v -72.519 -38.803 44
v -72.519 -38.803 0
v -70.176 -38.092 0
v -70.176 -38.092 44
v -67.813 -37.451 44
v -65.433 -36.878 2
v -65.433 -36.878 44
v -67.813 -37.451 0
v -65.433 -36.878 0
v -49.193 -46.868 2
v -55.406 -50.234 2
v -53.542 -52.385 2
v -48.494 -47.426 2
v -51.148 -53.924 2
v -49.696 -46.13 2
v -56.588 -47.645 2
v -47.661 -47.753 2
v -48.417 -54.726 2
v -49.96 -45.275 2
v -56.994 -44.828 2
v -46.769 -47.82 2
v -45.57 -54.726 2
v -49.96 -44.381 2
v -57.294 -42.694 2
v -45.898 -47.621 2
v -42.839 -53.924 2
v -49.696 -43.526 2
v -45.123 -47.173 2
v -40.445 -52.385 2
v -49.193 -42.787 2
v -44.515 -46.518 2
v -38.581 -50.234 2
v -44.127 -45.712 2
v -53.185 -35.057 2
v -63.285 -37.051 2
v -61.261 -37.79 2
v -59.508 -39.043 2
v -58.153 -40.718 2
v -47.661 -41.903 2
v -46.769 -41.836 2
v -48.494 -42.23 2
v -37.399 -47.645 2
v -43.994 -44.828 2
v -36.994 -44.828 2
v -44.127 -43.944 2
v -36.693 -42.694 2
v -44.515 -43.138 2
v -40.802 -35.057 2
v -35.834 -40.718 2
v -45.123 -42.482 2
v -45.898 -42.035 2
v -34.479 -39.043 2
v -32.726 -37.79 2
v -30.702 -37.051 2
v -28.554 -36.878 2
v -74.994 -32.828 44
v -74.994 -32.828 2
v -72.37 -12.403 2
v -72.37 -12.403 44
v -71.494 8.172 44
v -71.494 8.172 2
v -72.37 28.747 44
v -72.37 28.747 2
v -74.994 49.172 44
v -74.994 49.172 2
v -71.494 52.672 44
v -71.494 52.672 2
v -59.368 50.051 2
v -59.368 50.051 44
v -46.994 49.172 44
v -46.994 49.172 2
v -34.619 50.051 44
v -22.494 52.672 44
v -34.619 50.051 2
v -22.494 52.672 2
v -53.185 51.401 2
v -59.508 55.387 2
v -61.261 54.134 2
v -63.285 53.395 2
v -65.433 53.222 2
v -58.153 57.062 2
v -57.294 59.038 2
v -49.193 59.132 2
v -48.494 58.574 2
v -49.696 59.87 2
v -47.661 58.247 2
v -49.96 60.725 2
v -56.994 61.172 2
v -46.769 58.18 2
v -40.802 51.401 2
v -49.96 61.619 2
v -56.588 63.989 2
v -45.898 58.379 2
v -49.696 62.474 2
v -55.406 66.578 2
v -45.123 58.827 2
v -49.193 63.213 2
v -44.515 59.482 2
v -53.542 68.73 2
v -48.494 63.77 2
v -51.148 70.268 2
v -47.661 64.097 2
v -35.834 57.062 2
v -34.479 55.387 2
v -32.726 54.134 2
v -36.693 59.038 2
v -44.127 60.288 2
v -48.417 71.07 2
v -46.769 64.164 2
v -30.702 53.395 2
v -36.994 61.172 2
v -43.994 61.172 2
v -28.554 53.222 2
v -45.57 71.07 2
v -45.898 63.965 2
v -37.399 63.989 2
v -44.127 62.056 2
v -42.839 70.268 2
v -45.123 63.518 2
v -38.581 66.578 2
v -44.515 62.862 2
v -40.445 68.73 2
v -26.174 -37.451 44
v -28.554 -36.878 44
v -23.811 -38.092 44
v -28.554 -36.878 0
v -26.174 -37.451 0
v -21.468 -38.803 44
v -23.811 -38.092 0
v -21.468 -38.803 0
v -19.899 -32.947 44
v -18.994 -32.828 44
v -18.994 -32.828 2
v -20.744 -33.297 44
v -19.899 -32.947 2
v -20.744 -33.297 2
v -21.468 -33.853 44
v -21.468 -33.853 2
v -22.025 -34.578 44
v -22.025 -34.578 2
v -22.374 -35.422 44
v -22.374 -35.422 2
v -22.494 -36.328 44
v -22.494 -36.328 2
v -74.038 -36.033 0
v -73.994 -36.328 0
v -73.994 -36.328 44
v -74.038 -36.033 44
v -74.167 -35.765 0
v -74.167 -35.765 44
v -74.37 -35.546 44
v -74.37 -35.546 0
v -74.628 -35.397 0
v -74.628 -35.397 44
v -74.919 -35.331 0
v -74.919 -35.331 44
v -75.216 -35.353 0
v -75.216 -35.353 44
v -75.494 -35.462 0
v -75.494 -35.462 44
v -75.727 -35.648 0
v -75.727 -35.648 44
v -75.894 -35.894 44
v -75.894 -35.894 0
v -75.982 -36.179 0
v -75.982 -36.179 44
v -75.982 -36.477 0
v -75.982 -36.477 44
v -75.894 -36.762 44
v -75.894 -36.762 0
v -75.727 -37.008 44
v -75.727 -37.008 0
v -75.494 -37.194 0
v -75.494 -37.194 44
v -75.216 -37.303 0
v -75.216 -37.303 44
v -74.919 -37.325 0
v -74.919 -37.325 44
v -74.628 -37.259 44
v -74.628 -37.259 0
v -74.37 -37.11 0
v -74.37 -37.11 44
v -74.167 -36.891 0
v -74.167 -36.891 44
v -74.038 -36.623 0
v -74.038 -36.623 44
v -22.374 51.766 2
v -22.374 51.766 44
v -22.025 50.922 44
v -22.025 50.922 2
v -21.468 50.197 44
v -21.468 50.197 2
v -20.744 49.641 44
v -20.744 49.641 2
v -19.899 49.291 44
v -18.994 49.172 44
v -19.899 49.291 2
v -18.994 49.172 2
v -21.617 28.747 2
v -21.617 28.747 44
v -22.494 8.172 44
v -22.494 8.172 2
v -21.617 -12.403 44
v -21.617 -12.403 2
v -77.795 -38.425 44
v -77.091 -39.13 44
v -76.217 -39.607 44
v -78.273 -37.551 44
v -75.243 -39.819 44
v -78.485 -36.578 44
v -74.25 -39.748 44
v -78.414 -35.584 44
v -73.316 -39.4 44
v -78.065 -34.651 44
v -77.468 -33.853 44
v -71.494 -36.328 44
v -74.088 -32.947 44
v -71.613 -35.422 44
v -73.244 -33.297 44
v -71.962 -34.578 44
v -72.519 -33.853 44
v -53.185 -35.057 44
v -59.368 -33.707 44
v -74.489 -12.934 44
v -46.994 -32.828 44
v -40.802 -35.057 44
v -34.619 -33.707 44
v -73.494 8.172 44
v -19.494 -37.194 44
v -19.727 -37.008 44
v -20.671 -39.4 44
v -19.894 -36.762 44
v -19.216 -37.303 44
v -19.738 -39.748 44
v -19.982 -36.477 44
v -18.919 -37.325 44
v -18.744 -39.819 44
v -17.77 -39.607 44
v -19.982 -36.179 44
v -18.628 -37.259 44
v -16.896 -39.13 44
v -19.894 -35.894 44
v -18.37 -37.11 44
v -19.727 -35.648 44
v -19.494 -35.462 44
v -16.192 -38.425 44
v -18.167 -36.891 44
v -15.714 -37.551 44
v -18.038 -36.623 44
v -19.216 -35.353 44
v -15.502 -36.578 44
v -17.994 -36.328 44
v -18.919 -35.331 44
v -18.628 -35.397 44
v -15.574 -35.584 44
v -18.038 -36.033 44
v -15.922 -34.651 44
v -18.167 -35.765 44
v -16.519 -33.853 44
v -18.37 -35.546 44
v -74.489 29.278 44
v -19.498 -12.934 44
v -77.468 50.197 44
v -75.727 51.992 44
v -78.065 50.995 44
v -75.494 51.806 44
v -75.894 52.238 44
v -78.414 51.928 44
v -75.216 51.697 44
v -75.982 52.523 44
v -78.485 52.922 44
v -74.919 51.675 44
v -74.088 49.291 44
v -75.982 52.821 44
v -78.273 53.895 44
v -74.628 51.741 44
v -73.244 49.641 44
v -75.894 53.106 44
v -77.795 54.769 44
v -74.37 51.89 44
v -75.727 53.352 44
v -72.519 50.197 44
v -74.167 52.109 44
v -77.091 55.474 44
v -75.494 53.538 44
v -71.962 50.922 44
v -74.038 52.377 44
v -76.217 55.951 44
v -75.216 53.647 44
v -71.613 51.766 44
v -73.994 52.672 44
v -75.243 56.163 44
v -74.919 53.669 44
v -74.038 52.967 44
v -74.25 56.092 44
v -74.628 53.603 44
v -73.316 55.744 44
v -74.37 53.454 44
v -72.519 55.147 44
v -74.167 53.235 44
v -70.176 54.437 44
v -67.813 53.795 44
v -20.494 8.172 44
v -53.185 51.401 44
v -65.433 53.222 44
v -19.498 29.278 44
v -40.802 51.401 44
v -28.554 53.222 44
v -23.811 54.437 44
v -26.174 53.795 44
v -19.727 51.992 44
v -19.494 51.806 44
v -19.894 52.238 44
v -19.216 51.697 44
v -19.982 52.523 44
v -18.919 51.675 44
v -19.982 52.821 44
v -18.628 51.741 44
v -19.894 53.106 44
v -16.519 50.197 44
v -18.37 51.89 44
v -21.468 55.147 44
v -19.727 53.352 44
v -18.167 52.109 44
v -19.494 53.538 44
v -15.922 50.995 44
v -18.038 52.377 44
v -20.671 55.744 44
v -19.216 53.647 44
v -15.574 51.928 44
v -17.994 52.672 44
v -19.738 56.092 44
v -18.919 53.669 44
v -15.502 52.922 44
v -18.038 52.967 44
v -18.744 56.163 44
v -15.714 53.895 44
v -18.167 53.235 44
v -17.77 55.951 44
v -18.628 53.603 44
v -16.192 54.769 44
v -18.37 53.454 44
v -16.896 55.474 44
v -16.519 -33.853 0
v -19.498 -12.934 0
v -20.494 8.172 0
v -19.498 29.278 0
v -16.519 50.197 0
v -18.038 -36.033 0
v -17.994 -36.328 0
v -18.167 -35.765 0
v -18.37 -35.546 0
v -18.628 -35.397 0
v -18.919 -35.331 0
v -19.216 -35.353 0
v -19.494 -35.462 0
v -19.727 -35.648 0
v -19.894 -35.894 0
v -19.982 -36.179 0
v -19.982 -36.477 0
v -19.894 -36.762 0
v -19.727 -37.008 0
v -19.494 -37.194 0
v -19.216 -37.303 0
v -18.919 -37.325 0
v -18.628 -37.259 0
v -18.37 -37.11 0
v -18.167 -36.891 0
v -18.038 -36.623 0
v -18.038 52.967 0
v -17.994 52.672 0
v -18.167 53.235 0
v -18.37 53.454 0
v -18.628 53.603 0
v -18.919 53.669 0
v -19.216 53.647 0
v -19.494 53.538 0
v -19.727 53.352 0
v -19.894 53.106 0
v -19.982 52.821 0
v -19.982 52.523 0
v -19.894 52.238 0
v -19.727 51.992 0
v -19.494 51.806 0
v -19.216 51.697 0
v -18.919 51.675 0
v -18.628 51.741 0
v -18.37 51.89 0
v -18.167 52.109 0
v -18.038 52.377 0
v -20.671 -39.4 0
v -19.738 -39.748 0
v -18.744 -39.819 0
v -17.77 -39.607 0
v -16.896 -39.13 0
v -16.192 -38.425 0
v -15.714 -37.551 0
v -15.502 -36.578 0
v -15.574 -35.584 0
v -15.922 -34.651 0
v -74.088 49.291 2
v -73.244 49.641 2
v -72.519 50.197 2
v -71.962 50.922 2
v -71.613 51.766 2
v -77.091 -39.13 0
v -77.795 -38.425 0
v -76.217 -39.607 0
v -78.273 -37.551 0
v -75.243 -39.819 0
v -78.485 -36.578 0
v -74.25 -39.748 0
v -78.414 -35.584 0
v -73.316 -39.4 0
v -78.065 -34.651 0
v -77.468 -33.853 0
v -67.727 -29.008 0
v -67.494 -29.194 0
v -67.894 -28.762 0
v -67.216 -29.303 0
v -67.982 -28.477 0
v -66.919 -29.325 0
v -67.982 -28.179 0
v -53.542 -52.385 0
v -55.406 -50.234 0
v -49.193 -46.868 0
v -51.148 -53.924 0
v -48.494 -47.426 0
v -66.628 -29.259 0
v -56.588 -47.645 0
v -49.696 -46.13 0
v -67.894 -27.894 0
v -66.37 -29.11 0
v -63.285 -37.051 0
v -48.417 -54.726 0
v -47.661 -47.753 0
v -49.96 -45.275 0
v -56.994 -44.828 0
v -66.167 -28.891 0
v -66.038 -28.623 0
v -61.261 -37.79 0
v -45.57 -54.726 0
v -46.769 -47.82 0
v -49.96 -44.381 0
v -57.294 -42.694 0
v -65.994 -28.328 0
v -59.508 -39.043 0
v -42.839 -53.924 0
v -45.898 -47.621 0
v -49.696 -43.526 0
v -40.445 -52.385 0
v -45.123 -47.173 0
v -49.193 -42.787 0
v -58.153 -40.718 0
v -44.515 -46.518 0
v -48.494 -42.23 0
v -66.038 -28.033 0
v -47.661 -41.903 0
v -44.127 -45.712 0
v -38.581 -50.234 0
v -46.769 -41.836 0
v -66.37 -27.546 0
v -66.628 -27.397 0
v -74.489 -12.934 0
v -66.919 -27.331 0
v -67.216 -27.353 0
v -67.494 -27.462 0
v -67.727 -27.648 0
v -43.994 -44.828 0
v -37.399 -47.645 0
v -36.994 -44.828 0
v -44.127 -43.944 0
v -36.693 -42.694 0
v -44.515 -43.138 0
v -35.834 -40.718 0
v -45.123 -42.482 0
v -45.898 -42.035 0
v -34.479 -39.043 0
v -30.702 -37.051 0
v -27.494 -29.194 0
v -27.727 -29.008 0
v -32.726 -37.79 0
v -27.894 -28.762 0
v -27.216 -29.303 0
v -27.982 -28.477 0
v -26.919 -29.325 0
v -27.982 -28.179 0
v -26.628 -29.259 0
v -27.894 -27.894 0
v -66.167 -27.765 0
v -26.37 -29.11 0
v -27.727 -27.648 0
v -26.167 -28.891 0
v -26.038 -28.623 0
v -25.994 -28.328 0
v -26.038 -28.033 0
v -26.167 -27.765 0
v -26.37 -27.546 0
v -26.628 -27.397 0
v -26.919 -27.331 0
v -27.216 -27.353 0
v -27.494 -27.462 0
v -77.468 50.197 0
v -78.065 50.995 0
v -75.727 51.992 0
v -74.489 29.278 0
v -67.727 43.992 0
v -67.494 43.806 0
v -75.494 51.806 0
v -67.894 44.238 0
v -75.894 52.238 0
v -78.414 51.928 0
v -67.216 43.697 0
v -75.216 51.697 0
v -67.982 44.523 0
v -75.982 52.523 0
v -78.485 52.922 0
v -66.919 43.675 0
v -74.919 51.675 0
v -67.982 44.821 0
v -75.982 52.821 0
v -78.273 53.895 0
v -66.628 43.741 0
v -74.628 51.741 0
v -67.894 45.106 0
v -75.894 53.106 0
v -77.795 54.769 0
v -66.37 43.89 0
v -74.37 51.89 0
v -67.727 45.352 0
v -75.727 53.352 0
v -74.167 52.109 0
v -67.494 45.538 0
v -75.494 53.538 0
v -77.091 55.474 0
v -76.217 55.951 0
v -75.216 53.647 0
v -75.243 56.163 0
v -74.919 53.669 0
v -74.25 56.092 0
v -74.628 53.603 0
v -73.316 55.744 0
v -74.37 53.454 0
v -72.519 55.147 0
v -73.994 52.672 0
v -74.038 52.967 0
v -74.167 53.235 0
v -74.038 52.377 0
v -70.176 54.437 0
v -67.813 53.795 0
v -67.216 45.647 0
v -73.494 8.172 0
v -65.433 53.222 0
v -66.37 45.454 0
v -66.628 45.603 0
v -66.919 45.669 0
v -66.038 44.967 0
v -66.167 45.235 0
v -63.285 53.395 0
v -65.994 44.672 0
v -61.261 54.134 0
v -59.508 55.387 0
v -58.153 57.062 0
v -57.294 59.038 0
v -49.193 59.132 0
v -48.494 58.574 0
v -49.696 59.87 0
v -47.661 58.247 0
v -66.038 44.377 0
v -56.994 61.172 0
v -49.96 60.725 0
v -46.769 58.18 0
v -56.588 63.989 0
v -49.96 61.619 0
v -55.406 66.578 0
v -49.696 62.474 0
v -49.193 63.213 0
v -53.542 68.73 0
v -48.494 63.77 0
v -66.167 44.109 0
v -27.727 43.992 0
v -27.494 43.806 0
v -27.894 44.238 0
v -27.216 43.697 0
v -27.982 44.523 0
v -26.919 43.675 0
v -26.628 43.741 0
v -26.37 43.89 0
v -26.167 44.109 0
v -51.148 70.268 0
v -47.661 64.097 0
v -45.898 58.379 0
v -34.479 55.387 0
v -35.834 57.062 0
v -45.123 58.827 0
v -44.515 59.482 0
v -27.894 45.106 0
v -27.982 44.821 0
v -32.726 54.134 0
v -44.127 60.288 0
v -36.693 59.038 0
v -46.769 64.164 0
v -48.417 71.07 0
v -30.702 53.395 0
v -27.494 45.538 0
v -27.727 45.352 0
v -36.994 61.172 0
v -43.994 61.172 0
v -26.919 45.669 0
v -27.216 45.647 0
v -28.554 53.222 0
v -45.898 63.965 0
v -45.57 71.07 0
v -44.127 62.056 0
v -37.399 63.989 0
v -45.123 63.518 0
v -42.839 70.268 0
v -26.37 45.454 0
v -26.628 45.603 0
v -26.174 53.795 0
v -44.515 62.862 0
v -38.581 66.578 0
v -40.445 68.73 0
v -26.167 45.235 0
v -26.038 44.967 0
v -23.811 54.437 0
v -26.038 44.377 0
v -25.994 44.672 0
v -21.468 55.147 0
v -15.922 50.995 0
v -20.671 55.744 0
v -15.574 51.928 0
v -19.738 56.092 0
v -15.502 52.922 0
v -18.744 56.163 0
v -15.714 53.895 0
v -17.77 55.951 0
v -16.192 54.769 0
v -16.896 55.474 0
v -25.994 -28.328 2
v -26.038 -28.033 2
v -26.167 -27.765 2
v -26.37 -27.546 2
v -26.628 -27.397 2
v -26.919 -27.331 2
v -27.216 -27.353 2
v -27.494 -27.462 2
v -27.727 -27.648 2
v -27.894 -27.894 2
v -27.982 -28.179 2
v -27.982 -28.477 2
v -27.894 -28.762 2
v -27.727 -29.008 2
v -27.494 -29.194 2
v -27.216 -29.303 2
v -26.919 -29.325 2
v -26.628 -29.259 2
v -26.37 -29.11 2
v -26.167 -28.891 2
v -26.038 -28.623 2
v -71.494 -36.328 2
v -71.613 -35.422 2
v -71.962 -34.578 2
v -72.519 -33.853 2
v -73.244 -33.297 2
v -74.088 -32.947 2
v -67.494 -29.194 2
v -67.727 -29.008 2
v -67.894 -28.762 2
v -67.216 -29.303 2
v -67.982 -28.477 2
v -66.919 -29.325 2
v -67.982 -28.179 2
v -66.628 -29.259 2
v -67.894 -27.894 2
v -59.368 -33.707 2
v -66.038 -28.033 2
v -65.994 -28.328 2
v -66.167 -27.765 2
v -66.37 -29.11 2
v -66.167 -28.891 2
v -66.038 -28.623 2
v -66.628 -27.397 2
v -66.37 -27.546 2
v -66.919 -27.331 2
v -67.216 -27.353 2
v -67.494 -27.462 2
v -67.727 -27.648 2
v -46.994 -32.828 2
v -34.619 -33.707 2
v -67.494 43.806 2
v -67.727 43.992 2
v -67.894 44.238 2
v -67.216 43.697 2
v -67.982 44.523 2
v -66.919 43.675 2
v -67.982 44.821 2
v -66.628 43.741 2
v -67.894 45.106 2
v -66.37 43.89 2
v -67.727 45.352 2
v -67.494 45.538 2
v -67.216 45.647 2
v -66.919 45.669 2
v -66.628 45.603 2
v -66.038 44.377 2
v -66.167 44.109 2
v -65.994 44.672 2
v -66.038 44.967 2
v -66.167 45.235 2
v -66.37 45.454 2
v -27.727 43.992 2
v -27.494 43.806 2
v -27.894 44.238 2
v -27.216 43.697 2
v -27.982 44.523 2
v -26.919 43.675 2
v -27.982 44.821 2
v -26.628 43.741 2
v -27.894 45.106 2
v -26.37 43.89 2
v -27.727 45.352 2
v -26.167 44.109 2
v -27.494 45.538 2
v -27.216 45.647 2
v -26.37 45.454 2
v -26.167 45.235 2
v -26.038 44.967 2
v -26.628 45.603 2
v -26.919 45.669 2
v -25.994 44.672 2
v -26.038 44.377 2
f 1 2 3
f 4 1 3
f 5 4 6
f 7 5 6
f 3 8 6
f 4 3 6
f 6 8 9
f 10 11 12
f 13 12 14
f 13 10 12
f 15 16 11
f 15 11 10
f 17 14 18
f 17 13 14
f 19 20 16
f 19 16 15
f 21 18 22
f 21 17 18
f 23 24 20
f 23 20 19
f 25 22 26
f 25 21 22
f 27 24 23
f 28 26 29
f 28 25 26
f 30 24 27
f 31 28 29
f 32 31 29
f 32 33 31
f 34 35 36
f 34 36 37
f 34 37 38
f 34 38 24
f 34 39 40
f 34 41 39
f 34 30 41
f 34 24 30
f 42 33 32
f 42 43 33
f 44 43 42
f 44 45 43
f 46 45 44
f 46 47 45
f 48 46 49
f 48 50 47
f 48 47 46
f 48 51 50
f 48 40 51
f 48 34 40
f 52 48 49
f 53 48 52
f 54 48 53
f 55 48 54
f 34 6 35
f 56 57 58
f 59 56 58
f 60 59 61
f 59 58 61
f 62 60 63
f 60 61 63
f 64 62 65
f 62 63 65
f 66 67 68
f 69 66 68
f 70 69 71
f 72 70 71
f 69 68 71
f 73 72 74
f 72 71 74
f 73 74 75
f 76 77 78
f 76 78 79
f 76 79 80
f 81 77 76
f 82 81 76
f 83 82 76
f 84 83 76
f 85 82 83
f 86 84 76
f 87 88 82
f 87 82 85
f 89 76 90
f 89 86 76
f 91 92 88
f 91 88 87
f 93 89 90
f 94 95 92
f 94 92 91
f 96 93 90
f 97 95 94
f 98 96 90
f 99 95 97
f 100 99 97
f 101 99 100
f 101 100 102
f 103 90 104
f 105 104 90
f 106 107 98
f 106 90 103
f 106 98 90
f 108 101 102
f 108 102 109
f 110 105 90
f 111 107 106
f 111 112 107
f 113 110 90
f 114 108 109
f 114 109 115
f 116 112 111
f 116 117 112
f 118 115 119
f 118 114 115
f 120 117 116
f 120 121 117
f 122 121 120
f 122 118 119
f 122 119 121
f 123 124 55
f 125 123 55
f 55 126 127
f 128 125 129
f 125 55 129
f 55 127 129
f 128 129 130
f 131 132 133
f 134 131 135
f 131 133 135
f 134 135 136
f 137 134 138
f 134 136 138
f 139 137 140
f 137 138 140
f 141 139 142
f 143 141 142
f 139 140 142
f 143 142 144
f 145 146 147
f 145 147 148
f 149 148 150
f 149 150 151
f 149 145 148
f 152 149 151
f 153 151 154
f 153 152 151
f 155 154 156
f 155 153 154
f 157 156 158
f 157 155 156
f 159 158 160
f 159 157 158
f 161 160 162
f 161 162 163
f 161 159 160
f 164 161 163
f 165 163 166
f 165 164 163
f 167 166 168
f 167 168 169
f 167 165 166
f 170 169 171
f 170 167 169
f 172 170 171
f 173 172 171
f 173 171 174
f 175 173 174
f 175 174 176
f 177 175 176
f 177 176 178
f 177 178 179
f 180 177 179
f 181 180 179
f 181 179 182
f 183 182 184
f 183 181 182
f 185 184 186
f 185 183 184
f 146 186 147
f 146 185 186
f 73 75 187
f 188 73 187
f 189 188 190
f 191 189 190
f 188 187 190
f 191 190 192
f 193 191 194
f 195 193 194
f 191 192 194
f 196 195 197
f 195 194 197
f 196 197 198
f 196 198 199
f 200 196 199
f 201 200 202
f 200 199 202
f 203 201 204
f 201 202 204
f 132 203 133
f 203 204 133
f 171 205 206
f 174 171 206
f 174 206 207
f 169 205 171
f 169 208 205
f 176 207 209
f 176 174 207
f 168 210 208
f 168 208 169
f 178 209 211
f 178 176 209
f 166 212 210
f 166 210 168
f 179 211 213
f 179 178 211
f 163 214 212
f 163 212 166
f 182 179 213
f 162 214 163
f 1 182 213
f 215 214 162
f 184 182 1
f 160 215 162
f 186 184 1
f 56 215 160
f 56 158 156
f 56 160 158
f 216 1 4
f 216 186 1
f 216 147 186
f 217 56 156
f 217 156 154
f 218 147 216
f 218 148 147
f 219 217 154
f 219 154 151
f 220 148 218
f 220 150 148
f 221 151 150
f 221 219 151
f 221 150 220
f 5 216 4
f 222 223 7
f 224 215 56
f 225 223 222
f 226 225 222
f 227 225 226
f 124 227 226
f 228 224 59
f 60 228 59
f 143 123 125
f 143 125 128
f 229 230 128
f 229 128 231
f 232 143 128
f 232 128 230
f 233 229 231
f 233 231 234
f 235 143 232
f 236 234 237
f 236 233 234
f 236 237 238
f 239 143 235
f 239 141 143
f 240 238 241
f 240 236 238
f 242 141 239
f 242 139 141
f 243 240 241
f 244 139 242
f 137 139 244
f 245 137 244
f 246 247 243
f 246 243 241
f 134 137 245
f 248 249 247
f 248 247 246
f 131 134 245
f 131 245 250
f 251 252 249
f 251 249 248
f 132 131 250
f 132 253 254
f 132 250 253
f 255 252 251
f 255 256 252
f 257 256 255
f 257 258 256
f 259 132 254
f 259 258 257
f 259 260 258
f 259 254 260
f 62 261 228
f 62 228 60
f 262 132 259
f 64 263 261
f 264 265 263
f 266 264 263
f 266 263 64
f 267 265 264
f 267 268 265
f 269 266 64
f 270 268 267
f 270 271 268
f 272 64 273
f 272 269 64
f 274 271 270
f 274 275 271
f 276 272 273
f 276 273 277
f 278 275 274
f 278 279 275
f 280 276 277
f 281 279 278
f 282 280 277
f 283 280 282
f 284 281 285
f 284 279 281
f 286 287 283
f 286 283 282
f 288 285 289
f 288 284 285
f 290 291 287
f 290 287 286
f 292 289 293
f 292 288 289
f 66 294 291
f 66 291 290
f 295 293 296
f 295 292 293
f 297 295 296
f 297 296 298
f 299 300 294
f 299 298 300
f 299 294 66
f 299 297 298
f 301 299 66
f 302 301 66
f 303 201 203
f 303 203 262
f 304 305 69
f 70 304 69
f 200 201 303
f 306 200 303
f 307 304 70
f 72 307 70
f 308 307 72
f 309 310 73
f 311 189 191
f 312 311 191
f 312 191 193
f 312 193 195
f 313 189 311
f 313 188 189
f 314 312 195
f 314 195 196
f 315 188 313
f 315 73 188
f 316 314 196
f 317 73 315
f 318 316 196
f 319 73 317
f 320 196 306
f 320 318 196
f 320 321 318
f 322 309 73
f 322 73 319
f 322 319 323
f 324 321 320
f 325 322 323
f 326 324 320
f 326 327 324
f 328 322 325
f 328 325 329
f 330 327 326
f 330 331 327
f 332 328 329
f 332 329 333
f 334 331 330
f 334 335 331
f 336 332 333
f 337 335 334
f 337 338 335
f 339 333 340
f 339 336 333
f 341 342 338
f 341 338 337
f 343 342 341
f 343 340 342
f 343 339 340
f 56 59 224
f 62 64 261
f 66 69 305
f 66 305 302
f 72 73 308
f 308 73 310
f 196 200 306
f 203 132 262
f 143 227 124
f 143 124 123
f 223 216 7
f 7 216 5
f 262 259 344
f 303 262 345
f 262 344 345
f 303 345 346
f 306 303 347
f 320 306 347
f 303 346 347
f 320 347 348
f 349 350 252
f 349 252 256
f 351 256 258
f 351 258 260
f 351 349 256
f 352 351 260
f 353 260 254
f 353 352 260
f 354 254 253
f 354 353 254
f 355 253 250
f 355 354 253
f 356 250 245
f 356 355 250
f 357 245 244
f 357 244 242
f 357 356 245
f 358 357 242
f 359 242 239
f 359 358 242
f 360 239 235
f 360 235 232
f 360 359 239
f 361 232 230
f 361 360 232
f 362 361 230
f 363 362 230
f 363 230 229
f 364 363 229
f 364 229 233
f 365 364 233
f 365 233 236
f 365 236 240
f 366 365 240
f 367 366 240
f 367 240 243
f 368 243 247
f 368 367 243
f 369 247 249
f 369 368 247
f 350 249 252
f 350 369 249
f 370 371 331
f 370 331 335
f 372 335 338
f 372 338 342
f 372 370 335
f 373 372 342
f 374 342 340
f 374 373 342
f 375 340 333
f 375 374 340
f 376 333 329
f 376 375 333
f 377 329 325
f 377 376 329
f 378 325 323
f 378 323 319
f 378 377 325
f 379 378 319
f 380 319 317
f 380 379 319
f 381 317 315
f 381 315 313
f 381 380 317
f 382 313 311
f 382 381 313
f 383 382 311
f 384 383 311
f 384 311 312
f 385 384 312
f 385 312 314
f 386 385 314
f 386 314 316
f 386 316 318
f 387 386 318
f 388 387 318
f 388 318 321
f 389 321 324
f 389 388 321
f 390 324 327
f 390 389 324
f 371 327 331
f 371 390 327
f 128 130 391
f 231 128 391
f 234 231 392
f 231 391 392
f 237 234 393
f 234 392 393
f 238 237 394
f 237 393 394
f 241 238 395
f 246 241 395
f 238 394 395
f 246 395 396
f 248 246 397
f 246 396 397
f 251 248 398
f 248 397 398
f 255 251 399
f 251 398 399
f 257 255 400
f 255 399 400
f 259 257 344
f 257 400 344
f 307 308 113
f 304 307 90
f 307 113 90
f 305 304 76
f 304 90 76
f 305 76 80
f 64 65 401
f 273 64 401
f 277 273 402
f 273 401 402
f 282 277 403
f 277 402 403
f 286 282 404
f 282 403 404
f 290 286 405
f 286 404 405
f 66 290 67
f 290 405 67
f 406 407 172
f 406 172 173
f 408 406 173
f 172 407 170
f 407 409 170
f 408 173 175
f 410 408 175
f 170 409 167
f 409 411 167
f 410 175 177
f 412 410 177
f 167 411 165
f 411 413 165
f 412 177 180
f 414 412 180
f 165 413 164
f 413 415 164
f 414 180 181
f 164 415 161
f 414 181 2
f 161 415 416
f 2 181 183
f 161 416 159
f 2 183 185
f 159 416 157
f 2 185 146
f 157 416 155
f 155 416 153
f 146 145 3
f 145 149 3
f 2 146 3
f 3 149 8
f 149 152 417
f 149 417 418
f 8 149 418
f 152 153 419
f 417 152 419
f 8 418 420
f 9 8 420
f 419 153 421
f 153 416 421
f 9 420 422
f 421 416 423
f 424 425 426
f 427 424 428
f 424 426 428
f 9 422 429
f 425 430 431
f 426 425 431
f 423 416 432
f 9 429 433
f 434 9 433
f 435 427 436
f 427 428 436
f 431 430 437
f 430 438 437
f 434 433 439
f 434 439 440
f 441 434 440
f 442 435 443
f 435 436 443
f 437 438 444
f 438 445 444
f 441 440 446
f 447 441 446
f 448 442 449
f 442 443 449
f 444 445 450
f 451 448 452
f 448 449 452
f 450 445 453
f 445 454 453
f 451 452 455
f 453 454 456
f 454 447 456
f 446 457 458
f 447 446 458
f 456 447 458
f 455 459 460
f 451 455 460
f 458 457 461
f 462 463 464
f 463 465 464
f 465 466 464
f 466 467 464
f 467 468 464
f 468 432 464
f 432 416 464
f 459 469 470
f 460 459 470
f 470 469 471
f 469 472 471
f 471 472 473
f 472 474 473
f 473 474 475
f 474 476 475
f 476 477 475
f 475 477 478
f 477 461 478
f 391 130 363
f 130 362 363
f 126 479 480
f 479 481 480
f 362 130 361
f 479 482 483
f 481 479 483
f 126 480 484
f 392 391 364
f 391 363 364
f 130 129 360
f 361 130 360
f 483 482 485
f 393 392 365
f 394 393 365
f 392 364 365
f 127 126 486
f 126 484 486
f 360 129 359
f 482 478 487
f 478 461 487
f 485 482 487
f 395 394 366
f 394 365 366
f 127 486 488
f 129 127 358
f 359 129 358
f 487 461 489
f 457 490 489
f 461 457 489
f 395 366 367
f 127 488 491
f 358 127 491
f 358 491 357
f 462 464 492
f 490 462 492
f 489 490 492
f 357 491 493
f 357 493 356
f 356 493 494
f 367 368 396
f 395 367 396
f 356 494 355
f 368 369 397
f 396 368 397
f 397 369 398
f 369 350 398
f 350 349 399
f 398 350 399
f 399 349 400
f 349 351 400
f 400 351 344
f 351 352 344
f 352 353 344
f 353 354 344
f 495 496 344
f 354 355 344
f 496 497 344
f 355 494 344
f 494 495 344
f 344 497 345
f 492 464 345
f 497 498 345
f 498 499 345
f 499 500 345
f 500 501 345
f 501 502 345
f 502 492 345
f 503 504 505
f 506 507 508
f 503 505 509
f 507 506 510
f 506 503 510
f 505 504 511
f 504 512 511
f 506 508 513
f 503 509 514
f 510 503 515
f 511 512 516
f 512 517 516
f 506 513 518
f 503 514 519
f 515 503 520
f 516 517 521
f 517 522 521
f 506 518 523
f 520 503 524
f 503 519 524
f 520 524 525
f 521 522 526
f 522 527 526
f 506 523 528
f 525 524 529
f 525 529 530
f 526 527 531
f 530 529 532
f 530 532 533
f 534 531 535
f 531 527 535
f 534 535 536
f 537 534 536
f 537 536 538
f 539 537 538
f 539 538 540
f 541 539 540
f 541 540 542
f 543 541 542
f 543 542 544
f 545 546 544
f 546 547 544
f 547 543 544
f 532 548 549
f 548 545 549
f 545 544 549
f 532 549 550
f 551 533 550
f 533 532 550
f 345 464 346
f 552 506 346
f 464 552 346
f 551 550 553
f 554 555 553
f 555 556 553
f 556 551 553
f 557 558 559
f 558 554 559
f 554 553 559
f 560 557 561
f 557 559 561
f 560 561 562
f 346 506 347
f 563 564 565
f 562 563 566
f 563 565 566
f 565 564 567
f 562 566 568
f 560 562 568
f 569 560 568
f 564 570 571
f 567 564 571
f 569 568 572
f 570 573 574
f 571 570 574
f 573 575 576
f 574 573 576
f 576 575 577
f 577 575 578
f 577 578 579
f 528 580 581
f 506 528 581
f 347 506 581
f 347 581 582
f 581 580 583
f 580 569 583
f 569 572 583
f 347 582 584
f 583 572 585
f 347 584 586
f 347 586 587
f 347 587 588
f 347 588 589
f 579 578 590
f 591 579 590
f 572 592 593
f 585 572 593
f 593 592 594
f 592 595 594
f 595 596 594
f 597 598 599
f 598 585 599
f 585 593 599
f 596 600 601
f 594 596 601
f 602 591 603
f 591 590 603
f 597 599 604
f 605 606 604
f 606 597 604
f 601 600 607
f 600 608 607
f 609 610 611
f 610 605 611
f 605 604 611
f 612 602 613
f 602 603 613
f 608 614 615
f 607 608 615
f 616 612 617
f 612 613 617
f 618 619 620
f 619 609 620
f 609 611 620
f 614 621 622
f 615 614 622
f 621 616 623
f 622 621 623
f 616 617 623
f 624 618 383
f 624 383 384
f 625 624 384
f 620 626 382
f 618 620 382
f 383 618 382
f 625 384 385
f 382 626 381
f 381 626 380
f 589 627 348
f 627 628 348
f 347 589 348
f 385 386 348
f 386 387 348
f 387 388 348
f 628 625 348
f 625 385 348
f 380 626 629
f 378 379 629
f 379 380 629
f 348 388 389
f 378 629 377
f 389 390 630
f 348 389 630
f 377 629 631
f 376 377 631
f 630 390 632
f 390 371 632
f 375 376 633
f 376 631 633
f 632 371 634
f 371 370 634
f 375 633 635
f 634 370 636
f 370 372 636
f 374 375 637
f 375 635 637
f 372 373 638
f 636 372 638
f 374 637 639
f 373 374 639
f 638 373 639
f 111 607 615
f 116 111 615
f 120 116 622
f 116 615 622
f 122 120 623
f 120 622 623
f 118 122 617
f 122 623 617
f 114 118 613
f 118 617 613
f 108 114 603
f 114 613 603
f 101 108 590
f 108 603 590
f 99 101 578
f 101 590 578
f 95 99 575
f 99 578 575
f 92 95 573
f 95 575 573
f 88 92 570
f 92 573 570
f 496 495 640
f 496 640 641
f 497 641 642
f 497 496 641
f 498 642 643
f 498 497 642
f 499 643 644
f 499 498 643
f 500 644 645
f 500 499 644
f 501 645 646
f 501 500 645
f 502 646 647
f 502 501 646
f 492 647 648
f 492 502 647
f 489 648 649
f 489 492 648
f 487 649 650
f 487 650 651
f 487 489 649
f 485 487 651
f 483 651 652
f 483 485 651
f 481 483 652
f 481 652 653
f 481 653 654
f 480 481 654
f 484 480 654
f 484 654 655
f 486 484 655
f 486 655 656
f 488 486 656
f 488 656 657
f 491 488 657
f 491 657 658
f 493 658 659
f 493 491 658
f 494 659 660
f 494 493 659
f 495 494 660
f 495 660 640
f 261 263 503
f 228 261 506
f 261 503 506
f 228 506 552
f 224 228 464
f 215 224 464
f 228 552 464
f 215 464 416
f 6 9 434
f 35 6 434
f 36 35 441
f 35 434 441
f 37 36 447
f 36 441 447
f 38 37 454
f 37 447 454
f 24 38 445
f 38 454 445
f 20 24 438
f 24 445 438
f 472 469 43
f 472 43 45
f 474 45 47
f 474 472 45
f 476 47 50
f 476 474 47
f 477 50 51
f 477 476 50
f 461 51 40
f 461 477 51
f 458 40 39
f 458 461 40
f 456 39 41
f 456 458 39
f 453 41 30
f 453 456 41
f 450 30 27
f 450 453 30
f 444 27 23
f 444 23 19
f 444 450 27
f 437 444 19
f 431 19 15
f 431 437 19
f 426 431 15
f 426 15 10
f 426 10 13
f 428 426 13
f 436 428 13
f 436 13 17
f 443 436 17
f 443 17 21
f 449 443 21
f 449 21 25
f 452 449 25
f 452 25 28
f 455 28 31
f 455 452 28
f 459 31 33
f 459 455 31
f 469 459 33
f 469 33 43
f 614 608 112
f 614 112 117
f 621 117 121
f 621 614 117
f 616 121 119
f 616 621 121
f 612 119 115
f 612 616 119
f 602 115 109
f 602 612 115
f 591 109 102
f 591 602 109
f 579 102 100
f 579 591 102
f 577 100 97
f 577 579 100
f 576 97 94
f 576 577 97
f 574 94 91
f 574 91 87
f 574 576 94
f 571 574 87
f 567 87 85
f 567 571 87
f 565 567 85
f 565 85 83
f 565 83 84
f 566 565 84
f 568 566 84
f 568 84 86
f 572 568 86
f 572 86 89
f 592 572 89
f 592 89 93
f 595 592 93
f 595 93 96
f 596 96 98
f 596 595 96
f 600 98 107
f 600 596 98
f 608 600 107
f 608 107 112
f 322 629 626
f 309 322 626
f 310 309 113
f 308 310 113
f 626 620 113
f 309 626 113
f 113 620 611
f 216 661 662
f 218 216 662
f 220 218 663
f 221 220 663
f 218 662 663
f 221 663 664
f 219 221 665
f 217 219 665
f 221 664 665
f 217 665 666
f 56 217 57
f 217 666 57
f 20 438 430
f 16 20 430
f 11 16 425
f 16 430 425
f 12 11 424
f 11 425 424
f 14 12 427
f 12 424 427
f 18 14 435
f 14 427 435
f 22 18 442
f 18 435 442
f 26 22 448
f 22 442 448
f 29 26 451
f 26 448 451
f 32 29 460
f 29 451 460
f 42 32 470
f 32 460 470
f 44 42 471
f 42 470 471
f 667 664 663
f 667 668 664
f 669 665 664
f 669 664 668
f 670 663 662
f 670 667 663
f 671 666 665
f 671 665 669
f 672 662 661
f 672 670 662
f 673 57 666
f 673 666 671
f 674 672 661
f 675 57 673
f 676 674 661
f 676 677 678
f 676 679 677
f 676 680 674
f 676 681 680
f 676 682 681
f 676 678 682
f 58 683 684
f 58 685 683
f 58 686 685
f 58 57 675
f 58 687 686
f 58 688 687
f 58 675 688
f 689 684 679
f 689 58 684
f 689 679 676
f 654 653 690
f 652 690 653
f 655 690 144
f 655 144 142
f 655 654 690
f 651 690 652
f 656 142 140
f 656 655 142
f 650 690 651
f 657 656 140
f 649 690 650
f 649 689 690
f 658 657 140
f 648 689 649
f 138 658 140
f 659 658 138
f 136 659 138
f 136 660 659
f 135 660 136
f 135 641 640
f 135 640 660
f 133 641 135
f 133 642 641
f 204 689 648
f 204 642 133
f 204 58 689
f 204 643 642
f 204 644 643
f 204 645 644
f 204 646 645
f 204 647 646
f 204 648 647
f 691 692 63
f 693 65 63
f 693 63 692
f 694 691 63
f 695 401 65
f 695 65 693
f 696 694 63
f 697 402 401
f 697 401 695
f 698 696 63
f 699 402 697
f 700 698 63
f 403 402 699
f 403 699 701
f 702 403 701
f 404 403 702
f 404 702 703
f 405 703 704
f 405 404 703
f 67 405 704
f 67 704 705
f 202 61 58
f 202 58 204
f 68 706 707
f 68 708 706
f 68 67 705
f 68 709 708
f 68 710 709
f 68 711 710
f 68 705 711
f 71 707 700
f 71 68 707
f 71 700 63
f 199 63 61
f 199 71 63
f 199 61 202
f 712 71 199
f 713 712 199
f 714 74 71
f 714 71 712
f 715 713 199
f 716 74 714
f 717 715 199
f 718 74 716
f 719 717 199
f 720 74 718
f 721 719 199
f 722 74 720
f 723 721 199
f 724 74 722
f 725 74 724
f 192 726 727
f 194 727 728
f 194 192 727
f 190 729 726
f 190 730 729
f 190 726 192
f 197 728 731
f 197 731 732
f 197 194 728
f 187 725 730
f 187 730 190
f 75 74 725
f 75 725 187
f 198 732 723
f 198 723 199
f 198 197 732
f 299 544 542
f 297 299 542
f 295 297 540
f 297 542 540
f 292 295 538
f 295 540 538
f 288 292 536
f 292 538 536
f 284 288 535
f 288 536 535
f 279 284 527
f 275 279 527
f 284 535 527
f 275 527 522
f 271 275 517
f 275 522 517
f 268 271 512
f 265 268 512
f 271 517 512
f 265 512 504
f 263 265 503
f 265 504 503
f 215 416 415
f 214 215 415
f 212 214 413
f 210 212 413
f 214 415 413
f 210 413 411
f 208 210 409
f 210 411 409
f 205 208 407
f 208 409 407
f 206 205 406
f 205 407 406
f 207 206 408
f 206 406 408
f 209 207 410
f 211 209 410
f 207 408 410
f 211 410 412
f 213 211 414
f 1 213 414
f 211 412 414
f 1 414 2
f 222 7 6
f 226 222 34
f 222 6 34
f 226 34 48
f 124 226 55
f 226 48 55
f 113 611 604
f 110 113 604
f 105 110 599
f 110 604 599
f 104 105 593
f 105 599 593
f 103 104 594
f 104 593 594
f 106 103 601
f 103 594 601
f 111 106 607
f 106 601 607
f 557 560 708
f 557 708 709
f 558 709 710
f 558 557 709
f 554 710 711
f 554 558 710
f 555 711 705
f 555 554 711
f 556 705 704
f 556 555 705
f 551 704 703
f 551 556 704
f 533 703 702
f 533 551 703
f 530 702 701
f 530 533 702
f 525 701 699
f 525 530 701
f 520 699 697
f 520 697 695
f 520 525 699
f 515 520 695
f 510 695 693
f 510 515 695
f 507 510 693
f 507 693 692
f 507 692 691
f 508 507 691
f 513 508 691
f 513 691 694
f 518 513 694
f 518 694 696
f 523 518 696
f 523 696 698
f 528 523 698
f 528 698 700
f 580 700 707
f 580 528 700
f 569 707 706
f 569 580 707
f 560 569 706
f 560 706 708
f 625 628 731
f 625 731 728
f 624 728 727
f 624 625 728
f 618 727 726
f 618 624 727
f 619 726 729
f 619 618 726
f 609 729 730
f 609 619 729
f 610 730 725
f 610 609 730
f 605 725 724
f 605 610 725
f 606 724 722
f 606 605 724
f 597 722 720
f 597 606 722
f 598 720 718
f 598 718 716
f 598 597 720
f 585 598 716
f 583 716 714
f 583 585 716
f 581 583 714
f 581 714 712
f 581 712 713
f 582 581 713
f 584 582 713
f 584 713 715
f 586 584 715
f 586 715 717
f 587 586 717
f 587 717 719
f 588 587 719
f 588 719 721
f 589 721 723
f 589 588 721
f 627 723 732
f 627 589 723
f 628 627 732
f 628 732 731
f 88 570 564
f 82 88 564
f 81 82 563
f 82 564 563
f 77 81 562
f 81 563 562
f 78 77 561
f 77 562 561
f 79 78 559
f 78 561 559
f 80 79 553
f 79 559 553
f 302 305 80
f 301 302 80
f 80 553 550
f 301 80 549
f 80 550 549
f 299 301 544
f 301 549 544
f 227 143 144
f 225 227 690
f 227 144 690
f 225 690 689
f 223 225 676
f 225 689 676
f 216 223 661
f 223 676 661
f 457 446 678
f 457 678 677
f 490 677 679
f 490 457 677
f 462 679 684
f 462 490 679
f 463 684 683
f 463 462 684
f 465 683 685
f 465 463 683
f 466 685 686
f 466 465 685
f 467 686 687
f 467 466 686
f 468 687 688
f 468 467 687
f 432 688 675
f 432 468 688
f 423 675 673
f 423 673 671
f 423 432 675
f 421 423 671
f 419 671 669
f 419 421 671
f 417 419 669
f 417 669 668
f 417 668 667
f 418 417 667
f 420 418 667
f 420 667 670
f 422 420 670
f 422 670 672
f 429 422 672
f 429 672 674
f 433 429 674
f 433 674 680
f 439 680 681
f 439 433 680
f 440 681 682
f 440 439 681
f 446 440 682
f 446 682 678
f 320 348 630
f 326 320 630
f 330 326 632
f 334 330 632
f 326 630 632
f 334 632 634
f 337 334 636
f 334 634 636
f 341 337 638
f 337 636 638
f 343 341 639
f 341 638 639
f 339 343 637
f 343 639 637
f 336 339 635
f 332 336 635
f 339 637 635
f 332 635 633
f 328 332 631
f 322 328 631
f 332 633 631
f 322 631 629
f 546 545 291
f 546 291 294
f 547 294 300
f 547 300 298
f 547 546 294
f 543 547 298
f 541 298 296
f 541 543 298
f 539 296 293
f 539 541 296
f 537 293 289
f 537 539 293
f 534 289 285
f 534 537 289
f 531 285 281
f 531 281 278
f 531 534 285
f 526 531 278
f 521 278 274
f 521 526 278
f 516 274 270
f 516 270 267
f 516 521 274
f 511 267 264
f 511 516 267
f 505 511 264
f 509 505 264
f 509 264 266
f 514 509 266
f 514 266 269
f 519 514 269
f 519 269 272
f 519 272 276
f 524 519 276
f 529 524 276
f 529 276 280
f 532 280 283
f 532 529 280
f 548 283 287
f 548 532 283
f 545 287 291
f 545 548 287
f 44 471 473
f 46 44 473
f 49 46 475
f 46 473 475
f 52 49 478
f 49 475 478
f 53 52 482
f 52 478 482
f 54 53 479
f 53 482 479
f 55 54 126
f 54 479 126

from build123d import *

# Parameters (mm, degrees)
F0_R     = 1
F1_DEPTH = 44
F0_R_2   = 3
F2_DEPTH = 2


with BuildPart() as f1:
    # F0 (on Top) → F1 (new body)
    with BuildSketch(Plane.XY):
        with BuildLine():
            ThreePointArc((-77.468398, 50.197146), (-73.493525, 8.17202), (-77.468398, -33.853106))
            ThreePointArc((-77.468398, -33.853106), (-77.468398, -38.802854), (-72.518651, -38.802854))
            ThreePointArc((-72.518651, -38.802854), (-68.996757, -37.763021), (-65.432755, -36.878214))
            ThreePointArc((-65.432755, -36.878214), (-46.993525, -34.82798), (-28.554295, -36.878214))
            ThreePointArc((-28.554295, -36.878214), (-24.990293, -37.763021), (-21.468398, -38.802854))
            ThreePointArc((-21.468398, -38.802854), (-16.518651, -38.802854), (-16.518651, -33.853106))
            ThreePointArc((-16.518651, -33.853106), (-20.493525, 8.17202), (-16.518651, 50.197146))
            ThreePointArc((-16.518651, 50.197146), (-16.518651, 55.146894), (-21.468398, 55.146894))
            ThreePointArc((-21.468398, 55.146894), (-24.990293, 54.10706), (-28.554295, 53.222254))
            ThreePointArc((-28.554295, 53.222254), (-46.993525, 51.17202), (-65.432755, 53.222254))
            ThreePointArc((-65.432755, 53.222254), (-68.996757, 54.10706), (-72.518651, 55.146894))
            ThreePointArc((-72.518651, 55.146894), (-77.468398, 55.146894), (-77.468398, 50.197146))
        make_face()
        with Locations((-74.993525, -36.32798)):
            Circle(F0_R, mode=Mode.SUBTRACT)
        with Locations((-18.993525, -36.32798)):
            Circle(F0_R, mode=Mode.SUBTRACT)
        with BuildLine():
            ThreePointArc((-74.993525, 49.17202), (-72.518651, 50.197146), (-71.493525, 52.67202))
            ThreePointArc((-71.493525, 52.67202), (-46.993525, 49.17202), (-22.493525, 52.67202))
            ThreePointArc((-22.493525, 52.67202), (-21.468398, 50.197146), (-18.993525, 49.17202))
            ThreePointArc((-18.993525, 49.17202), (-22.493525, 8.17202), (-18.993525, -32.82798))
            ThreePointArc((-18.993525, -32.82798), (-21.468398, -33.853106), (-22.493525, -36.32798))
            ThreePointArc((-22.493525, -36.32798), (-46.993525, -32.82798), (-71.493525, -36.32798))
            ThreePointArc((-71.493525, -36.32798), (-72.518651, -33.853106), (-74.993525, -32.82798))
            ThreePointArc((-74.993525, -32.82798), (-71.493525, 8.17202), (-74.993525, 49.17202))
        make_face(mode=Mode.SUBTRACT)
        with Locations((-74.993525, 52.67202)):
            Circle(F0_R, mode=Mode.SUBTRACT)
        with Locations((-18.993525, 52.67202)):
            Circle(F0_R, mode=Mode.SUBTRACT)
    extrude(amount=F1_DEPTH)

    # F0 (on Top) → F2 (join)
    with BuildSketch(Plane.XY):
        with BuildLine():
            ThreePointArc((-28.554295, -36.878214), (-46.993525, -34.82798), (-65.432755, -36.878214))
            ThreePointArc((-65.432755, -36.878214), (-59.507969, -39.04294), (-56.993525, -44.82798))
            ThreePointArc((-56.993525, -44.82798), (-46.993525, -54.82798), (-36.993525, -44.82798))
            ThreePointArc((-36.993525, -44.82798), (-34.47908, -39.04294), (-28.554295, -36.878214))
        make_face()
        with Locations((-46.993525, -44.82798)):
            Circle(F0_R_2, mode=Mode.SUBTRACT)
        with BuildLine():
            ThreePointArc((-56.993525, 61.17202), (-59.507969, 55.38698), (-65.432755, 53.222254))
            ThreePointArc((-65.432755, 53.222254), (-46.993525, 51.17202), (-28.554295, 53.222254))
            ThreePointArc((-28.554295, 53.222254), (-34.47908, 55.38698), (-36.993525, 61.17202))
            ThreePointArc((-36.993525, 61.17202), (-46.993525, 71.17202), (-56.993525, 61.17202))
        make_face()
        with Locations((-46.993525, 61.17202)):
            Circle(F0_R_2, mode=Mode.SUBTRACT)
        with BuildLine():
            ThreePointArc((-22.493525, 52.67202), (-46.993525, 49.17202), (-71.493525, 52.67202))
            ThreePointArc((-71.493525, 52.67202), (-72.518651, 50.197146), (-74.993525, 49.17202))
            ThreePointArc((-74.993525, 49.17202), (-71.493525, 8.17202), (-74.993525, -32.82798))
            ThreePointArc((-74.993525, -32.82798), (-72.518651, -33.853106), (-71.493525, -36.32798))
            ThreePointArc((-71.493525, -36.32798), (-46.993525, -32.82798), (-22.493525, -36.32798))
            ThreePointArc((-22.493525, -36.32798), (-21.468398, -33.853106), (-18.993525, -32.82798))
            ThreePointArc((-18.993525, -32.82798), (-22.493525, 8.17202), (-18.993525, 49.17202))
            ThreePointArc((-18.993525, 49.17202), (-21.468398, 50.197146), (-22.493525, 52.67202))
        make_face()
        with Locations((-66.993525, -28.32798)):
            Circle(F0_R, mode=Mode.SUBTRACT)
        with Locations((-26.993525, -28.32798)):
            Circle(F0_R, mode=Mode.SUBTRACT)
        with Locations((-66.993525, 44.67202)):
            Circle(F0_R, mode=Mode.SUBTRACT)
        with Locations((-26.993525, 44.67202)):
            Circle(F0_R, mode=Mode.SUBTRACT)
    extrude(amount=F2_DEPTH)


solid = f1.part
